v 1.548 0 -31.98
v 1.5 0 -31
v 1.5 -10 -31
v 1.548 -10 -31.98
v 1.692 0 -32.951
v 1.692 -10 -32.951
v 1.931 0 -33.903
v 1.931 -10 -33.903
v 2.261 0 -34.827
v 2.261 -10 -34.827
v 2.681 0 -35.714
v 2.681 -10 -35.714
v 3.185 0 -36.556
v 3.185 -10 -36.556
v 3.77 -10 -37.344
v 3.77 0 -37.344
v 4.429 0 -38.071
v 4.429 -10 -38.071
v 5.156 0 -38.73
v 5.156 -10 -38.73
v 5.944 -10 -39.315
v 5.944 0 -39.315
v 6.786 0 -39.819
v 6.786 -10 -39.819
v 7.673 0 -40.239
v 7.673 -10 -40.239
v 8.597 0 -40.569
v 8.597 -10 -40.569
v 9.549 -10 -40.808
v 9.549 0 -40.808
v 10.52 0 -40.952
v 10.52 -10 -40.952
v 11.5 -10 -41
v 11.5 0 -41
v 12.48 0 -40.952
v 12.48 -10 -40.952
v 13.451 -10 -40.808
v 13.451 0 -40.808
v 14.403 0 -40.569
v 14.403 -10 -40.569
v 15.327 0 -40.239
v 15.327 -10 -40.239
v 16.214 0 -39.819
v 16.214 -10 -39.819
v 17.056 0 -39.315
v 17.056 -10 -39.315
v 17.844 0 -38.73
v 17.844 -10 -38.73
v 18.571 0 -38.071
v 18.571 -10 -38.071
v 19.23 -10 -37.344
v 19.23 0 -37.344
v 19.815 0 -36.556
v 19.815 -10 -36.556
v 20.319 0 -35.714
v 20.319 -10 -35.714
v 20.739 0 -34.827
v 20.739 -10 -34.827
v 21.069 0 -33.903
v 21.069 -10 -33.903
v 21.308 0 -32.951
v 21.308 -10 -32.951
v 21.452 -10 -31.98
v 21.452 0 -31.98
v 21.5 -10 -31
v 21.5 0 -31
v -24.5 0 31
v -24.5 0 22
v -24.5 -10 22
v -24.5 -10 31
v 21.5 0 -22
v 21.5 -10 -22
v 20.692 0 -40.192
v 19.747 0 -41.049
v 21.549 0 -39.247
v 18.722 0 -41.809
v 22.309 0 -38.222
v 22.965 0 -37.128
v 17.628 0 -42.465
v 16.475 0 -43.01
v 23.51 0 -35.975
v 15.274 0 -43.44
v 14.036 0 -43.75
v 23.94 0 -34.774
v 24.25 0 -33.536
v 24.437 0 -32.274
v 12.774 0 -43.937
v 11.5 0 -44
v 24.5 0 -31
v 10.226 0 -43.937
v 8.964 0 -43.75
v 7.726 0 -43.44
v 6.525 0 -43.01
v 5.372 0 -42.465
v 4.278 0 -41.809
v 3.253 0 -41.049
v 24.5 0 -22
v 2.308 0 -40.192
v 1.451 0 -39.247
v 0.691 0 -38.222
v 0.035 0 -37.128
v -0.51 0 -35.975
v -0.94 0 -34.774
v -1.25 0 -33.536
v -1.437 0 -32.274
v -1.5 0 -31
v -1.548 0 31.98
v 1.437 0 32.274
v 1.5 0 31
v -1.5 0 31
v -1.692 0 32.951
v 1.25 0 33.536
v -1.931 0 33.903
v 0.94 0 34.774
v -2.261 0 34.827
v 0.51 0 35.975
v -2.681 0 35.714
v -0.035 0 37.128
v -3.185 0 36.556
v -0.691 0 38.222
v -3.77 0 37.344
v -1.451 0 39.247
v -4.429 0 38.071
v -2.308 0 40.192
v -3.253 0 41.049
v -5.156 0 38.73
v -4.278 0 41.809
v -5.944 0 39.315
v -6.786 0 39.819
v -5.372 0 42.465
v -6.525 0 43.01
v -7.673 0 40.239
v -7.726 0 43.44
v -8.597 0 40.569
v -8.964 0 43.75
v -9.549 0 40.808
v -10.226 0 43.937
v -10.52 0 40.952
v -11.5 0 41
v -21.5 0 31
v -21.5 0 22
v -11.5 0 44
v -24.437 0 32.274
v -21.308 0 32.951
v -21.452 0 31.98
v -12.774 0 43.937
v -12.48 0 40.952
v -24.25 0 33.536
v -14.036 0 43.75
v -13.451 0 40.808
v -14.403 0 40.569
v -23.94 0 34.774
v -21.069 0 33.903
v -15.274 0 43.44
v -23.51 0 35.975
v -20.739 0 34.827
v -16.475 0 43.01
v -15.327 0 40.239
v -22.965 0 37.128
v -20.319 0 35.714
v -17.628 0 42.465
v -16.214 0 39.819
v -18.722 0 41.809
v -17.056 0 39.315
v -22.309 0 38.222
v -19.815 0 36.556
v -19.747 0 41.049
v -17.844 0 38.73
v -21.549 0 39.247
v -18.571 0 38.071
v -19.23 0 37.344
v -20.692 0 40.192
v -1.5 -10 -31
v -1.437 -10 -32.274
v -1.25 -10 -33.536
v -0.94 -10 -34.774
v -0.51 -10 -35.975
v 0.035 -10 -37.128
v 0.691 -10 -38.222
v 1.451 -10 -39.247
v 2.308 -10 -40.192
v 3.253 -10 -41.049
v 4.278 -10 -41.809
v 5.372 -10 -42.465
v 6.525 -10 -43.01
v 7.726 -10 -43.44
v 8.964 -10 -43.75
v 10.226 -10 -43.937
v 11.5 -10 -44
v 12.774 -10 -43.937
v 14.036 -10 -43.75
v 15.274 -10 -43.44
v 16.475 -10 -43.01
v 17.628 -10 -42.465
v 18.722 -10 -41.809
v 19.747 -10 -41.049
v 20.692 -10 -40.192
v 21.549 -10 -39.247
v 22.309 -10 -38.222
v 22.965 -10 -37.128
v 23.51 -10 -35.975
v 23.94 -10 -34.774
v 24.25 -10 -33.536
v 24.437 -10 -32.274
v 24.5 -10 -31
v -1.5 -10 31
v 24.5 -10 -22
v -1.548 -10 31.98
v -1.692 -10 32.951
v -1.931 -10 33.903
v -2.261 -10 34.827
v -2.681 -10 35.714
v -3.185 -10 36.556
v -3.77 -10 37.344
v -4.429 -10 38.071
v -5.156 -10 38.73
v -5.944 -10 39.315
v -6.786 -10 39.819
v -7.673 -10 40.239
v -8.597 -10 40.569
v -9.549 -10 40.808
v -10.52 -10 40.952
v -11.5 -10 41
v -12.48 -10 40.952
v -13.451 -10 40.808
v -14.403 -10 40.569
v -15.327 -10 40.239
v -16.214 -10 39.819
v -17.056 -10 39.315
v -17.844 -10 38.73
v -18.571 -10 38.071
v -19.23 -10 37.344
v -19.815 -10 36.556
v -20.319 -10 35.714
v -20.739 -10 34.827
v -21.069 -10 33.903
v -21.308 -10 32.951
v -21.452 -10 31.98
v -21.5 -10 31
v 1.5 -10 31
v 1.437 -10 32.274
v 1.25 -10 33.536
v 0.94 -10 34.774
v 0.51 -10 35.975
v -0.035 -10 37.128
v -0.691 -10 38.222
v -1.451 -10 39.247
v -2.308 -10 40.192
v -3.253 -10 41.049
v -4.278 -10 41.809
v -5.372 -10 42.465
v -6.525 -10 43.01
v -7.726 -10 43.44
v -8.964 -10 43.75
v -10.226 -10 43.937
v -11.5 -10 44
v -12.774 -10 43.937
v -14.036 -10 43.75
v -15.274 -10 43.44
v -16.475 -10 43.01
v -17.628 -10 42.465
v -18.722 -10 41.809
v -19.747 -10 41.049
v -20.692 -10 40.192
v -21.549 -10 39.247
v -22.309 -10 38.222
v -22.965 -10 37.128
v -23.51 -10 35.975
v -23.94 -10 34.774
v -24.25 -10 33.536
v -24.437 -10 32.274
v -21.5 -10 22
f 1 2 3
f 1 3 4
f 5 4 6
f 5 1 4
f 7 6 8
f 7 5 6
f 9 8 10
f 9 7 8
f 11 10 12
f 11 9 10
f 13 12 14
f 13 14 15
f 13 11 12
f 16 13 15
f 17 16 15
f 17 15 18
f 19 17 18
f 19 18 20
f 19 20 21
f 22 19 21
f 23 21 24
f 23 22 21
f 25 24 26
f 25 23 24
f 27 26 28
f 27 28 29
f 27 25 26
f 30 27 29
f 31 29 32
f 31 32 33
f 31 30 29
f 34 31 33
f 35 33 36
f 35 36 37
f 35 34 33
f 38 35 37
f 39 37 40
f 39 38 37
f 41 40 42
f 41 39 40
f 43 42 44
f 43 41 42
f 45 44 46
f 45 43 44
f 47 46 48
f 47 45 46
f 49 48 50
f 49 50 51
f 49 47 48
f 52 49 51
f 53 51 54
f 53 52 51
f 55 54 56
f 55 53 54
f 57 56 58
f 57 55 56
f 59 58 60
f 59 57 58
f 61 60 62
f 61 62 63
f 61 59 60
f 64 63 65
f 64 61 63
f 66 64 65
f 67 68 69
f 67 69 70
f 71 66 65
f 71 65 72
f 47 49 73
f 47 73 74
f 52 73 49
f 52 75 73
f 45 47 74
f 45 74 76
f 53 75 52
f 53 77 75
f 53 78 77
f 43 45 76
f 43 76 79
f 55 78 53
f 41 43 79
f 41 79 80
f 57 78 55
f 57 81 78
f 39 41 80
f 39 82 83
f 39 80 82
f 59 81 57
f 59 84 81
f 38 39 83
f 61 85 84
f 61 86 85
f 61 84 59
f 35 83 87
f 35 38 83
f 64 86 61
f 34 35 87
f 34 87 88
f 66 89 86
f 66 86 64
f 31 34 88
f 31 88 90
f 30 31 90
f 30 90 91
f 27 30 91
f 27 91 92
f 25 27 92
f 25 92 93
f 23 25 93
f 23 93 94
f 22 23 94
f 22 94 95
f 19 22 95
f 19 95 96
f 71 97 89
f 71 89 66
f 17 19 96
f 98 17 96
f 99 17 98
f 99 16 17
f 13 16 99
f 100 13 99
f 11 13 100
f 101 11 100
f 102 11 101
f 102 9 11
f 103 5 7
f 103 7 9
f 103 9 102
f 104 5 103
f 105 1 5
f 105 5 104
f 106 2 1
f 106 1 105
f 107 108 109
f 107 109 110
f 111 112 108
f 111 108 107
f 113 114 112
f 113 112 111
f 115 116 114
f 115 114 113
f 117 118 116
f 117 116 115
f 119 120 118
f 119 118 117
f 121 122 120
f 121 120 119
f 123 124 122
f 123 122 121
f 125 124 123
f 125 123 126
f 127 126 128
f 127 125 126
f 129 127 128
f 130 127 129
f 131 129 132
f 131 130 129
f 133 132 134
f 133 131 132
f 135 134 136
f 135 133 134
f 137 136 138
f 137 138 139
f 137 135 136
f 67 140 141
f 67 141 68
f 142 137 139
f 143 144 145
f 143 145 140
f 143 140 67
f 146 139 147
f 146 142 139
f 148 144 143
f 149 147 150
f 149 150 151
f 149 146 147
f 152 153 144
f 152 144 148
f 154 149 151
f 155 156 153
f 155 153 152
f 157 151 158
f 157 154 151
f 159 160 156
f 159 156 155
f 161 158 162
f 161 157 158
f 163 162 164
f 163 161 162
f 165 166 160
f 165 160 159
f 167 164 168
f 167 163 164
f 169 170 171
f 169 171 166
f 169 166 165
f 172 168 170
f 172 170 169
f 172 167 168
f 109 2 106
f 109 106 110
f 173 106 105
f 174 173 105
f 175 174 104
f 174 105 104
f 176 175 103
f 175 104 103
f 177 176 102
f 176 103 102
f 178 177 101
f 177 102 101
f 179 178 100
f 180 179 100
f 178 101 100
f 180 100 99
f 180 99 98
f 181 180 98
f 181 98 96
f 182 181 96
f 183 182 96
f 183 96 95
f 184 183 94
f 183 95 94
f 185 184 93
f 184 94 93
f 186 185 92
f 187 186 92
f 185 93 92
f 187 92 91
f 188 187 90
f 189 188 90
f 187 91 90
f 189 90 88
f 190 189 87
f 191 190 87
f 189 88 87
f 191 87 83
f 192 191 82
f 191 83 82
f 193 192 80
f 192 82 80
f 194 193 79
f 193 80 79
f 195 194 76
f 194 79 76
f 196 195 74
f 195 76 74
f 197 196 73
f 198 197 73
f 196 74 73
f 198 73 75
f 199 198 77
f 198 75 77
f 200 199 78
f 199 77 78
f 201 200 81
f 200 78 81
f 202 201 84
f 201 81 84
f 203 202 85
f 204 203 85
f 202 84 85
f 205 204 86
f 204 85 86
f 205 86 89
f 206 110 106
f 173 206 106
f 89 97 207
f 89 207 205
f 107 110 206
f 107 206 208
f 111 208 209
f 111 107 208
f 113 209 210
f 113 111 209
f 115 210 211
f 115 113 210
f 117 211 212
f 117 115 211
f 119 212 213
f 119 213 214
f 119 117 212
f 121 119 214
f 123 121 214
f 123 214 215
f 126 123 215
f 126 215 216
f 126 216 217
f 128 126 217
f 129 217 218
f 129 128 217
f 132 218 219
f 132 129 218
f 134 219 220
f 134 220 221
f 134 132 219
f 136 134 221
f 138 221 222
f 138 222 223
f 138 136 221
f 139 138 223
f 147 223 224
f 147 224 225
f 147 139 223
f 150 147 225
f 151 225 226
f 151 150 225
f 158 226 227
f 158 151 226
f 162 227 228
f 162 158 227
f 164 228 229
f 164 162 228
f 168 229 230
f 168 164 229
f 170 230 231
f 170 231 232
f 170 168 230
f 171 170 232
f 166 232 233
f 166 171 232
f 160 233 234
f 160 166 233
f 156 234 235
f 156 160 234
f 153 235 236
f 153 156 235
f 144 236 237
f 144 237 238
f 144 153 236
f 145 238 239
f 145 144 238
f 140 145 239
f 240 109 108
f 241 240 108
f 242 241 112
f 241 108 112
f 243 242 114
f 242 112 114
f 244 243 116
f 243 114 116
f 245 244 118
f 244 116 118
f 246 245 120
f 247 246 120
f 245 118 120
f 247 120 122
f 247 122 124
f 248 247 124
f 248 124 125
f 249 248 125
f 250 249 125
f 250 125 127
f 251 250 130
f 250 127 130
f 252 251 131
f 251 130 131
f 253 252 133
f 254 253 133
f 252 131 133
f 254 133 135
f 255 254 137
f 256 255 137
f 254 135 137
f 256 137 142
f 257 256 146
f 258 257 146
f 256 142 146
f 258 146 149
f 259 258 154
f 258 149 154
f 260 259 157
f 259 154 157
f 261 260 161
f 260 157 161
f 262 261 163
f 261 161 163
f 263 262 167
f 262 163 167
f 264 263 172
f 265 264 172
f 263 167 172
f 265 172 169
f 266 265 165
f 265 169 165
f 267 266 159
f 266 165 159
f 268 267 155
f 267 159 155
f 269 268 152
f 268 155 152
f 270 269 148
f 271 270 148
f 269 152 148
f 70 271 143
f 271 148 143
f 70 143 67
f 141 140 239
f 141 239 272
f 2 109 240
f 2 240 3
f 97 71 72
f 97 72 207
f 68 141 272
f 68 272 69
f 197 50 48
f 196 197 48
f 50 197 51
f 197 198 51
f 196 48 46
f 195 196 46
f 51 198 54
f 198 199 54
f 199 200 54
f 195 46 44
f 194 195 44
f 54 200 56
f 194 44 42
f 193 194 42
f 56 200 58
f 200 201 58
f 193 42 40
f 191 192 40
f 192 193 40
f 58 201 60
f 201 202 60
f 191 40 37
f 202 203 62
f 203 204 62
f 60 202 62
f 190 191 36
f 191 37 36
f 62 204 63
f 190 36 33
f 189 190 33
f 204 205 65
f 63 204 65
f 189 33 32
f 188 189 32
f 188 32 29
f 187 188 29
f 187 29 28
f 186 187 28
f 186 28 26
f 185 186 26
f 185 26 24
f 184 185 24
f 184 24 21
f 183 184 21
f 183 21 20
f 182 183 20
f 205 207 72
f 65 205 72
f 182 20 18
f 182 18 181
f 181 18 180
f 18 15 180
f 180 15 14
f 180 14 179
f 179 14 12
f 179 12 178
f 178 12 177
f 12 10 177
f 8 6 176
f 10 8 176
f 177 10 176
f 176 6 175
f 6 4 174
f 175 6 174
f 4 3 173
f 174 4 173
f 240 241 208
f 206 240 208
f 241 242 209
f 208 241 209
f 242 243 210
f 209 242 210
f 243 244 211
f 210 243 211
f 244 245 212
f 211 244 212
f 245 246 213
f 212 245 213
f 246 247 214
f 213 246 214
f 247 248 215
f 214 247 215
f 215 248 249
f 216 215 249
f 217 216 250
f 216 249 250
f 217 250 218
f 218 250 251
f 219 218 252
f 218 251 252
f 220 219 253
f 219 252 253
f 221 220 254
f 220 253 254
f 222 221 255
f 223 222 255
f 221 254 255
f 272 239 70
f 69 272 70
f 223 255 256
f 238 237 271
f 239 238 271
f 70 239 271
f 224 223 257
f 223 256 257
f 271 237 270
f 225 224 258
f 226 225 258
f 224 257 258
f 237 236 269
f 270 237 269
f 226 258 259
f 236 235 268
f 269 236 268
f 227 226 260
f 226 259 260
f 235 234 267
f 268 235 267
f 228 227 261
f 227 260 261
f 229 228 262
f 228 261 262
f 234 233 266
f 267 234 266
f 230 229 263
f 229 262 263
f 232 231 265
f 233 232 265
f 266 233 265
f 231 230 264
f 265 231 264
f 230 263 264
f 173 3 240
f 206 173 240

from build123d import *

# Parameters (mm, degrees)
PAD_DEPTH = 10


with BuildPart() as part:
    # Sketch → Pad (new body)
    with BuildSketch(Plane.XZ):
        with BuildLine():
            Line((-21.5, 31), (-21.5, 22))
            Line((-21.5, 22), (-24.5, 22))
            Line((-24.5, 22), (-24.5, 31))
            ThreePointArc((1.5, 31), (-11.5, 44), (-24.5, 31))
            Line((1.5, 31), (1.5, -31))
            ThreePointArc((1.5, -31), (11.5, -41), (21.5, -31))
            Line((21.5, -31), (21.5, -22))
            Line((21.5, -22), (24.5, -22))
            Line((24.5, -22), (24.5, -31))
            ThreePointArc((-1.5, -31), (11.5, -44), (24.5, -31))
            Line((-1.5, 31), (-1.5, -31))
            ThreePointArc((-1.5, 31), (-11.5, 41), (-21.5, 31))
        make_face()
    extrude(amount=PAD_DEPTH)


solid = part.part
